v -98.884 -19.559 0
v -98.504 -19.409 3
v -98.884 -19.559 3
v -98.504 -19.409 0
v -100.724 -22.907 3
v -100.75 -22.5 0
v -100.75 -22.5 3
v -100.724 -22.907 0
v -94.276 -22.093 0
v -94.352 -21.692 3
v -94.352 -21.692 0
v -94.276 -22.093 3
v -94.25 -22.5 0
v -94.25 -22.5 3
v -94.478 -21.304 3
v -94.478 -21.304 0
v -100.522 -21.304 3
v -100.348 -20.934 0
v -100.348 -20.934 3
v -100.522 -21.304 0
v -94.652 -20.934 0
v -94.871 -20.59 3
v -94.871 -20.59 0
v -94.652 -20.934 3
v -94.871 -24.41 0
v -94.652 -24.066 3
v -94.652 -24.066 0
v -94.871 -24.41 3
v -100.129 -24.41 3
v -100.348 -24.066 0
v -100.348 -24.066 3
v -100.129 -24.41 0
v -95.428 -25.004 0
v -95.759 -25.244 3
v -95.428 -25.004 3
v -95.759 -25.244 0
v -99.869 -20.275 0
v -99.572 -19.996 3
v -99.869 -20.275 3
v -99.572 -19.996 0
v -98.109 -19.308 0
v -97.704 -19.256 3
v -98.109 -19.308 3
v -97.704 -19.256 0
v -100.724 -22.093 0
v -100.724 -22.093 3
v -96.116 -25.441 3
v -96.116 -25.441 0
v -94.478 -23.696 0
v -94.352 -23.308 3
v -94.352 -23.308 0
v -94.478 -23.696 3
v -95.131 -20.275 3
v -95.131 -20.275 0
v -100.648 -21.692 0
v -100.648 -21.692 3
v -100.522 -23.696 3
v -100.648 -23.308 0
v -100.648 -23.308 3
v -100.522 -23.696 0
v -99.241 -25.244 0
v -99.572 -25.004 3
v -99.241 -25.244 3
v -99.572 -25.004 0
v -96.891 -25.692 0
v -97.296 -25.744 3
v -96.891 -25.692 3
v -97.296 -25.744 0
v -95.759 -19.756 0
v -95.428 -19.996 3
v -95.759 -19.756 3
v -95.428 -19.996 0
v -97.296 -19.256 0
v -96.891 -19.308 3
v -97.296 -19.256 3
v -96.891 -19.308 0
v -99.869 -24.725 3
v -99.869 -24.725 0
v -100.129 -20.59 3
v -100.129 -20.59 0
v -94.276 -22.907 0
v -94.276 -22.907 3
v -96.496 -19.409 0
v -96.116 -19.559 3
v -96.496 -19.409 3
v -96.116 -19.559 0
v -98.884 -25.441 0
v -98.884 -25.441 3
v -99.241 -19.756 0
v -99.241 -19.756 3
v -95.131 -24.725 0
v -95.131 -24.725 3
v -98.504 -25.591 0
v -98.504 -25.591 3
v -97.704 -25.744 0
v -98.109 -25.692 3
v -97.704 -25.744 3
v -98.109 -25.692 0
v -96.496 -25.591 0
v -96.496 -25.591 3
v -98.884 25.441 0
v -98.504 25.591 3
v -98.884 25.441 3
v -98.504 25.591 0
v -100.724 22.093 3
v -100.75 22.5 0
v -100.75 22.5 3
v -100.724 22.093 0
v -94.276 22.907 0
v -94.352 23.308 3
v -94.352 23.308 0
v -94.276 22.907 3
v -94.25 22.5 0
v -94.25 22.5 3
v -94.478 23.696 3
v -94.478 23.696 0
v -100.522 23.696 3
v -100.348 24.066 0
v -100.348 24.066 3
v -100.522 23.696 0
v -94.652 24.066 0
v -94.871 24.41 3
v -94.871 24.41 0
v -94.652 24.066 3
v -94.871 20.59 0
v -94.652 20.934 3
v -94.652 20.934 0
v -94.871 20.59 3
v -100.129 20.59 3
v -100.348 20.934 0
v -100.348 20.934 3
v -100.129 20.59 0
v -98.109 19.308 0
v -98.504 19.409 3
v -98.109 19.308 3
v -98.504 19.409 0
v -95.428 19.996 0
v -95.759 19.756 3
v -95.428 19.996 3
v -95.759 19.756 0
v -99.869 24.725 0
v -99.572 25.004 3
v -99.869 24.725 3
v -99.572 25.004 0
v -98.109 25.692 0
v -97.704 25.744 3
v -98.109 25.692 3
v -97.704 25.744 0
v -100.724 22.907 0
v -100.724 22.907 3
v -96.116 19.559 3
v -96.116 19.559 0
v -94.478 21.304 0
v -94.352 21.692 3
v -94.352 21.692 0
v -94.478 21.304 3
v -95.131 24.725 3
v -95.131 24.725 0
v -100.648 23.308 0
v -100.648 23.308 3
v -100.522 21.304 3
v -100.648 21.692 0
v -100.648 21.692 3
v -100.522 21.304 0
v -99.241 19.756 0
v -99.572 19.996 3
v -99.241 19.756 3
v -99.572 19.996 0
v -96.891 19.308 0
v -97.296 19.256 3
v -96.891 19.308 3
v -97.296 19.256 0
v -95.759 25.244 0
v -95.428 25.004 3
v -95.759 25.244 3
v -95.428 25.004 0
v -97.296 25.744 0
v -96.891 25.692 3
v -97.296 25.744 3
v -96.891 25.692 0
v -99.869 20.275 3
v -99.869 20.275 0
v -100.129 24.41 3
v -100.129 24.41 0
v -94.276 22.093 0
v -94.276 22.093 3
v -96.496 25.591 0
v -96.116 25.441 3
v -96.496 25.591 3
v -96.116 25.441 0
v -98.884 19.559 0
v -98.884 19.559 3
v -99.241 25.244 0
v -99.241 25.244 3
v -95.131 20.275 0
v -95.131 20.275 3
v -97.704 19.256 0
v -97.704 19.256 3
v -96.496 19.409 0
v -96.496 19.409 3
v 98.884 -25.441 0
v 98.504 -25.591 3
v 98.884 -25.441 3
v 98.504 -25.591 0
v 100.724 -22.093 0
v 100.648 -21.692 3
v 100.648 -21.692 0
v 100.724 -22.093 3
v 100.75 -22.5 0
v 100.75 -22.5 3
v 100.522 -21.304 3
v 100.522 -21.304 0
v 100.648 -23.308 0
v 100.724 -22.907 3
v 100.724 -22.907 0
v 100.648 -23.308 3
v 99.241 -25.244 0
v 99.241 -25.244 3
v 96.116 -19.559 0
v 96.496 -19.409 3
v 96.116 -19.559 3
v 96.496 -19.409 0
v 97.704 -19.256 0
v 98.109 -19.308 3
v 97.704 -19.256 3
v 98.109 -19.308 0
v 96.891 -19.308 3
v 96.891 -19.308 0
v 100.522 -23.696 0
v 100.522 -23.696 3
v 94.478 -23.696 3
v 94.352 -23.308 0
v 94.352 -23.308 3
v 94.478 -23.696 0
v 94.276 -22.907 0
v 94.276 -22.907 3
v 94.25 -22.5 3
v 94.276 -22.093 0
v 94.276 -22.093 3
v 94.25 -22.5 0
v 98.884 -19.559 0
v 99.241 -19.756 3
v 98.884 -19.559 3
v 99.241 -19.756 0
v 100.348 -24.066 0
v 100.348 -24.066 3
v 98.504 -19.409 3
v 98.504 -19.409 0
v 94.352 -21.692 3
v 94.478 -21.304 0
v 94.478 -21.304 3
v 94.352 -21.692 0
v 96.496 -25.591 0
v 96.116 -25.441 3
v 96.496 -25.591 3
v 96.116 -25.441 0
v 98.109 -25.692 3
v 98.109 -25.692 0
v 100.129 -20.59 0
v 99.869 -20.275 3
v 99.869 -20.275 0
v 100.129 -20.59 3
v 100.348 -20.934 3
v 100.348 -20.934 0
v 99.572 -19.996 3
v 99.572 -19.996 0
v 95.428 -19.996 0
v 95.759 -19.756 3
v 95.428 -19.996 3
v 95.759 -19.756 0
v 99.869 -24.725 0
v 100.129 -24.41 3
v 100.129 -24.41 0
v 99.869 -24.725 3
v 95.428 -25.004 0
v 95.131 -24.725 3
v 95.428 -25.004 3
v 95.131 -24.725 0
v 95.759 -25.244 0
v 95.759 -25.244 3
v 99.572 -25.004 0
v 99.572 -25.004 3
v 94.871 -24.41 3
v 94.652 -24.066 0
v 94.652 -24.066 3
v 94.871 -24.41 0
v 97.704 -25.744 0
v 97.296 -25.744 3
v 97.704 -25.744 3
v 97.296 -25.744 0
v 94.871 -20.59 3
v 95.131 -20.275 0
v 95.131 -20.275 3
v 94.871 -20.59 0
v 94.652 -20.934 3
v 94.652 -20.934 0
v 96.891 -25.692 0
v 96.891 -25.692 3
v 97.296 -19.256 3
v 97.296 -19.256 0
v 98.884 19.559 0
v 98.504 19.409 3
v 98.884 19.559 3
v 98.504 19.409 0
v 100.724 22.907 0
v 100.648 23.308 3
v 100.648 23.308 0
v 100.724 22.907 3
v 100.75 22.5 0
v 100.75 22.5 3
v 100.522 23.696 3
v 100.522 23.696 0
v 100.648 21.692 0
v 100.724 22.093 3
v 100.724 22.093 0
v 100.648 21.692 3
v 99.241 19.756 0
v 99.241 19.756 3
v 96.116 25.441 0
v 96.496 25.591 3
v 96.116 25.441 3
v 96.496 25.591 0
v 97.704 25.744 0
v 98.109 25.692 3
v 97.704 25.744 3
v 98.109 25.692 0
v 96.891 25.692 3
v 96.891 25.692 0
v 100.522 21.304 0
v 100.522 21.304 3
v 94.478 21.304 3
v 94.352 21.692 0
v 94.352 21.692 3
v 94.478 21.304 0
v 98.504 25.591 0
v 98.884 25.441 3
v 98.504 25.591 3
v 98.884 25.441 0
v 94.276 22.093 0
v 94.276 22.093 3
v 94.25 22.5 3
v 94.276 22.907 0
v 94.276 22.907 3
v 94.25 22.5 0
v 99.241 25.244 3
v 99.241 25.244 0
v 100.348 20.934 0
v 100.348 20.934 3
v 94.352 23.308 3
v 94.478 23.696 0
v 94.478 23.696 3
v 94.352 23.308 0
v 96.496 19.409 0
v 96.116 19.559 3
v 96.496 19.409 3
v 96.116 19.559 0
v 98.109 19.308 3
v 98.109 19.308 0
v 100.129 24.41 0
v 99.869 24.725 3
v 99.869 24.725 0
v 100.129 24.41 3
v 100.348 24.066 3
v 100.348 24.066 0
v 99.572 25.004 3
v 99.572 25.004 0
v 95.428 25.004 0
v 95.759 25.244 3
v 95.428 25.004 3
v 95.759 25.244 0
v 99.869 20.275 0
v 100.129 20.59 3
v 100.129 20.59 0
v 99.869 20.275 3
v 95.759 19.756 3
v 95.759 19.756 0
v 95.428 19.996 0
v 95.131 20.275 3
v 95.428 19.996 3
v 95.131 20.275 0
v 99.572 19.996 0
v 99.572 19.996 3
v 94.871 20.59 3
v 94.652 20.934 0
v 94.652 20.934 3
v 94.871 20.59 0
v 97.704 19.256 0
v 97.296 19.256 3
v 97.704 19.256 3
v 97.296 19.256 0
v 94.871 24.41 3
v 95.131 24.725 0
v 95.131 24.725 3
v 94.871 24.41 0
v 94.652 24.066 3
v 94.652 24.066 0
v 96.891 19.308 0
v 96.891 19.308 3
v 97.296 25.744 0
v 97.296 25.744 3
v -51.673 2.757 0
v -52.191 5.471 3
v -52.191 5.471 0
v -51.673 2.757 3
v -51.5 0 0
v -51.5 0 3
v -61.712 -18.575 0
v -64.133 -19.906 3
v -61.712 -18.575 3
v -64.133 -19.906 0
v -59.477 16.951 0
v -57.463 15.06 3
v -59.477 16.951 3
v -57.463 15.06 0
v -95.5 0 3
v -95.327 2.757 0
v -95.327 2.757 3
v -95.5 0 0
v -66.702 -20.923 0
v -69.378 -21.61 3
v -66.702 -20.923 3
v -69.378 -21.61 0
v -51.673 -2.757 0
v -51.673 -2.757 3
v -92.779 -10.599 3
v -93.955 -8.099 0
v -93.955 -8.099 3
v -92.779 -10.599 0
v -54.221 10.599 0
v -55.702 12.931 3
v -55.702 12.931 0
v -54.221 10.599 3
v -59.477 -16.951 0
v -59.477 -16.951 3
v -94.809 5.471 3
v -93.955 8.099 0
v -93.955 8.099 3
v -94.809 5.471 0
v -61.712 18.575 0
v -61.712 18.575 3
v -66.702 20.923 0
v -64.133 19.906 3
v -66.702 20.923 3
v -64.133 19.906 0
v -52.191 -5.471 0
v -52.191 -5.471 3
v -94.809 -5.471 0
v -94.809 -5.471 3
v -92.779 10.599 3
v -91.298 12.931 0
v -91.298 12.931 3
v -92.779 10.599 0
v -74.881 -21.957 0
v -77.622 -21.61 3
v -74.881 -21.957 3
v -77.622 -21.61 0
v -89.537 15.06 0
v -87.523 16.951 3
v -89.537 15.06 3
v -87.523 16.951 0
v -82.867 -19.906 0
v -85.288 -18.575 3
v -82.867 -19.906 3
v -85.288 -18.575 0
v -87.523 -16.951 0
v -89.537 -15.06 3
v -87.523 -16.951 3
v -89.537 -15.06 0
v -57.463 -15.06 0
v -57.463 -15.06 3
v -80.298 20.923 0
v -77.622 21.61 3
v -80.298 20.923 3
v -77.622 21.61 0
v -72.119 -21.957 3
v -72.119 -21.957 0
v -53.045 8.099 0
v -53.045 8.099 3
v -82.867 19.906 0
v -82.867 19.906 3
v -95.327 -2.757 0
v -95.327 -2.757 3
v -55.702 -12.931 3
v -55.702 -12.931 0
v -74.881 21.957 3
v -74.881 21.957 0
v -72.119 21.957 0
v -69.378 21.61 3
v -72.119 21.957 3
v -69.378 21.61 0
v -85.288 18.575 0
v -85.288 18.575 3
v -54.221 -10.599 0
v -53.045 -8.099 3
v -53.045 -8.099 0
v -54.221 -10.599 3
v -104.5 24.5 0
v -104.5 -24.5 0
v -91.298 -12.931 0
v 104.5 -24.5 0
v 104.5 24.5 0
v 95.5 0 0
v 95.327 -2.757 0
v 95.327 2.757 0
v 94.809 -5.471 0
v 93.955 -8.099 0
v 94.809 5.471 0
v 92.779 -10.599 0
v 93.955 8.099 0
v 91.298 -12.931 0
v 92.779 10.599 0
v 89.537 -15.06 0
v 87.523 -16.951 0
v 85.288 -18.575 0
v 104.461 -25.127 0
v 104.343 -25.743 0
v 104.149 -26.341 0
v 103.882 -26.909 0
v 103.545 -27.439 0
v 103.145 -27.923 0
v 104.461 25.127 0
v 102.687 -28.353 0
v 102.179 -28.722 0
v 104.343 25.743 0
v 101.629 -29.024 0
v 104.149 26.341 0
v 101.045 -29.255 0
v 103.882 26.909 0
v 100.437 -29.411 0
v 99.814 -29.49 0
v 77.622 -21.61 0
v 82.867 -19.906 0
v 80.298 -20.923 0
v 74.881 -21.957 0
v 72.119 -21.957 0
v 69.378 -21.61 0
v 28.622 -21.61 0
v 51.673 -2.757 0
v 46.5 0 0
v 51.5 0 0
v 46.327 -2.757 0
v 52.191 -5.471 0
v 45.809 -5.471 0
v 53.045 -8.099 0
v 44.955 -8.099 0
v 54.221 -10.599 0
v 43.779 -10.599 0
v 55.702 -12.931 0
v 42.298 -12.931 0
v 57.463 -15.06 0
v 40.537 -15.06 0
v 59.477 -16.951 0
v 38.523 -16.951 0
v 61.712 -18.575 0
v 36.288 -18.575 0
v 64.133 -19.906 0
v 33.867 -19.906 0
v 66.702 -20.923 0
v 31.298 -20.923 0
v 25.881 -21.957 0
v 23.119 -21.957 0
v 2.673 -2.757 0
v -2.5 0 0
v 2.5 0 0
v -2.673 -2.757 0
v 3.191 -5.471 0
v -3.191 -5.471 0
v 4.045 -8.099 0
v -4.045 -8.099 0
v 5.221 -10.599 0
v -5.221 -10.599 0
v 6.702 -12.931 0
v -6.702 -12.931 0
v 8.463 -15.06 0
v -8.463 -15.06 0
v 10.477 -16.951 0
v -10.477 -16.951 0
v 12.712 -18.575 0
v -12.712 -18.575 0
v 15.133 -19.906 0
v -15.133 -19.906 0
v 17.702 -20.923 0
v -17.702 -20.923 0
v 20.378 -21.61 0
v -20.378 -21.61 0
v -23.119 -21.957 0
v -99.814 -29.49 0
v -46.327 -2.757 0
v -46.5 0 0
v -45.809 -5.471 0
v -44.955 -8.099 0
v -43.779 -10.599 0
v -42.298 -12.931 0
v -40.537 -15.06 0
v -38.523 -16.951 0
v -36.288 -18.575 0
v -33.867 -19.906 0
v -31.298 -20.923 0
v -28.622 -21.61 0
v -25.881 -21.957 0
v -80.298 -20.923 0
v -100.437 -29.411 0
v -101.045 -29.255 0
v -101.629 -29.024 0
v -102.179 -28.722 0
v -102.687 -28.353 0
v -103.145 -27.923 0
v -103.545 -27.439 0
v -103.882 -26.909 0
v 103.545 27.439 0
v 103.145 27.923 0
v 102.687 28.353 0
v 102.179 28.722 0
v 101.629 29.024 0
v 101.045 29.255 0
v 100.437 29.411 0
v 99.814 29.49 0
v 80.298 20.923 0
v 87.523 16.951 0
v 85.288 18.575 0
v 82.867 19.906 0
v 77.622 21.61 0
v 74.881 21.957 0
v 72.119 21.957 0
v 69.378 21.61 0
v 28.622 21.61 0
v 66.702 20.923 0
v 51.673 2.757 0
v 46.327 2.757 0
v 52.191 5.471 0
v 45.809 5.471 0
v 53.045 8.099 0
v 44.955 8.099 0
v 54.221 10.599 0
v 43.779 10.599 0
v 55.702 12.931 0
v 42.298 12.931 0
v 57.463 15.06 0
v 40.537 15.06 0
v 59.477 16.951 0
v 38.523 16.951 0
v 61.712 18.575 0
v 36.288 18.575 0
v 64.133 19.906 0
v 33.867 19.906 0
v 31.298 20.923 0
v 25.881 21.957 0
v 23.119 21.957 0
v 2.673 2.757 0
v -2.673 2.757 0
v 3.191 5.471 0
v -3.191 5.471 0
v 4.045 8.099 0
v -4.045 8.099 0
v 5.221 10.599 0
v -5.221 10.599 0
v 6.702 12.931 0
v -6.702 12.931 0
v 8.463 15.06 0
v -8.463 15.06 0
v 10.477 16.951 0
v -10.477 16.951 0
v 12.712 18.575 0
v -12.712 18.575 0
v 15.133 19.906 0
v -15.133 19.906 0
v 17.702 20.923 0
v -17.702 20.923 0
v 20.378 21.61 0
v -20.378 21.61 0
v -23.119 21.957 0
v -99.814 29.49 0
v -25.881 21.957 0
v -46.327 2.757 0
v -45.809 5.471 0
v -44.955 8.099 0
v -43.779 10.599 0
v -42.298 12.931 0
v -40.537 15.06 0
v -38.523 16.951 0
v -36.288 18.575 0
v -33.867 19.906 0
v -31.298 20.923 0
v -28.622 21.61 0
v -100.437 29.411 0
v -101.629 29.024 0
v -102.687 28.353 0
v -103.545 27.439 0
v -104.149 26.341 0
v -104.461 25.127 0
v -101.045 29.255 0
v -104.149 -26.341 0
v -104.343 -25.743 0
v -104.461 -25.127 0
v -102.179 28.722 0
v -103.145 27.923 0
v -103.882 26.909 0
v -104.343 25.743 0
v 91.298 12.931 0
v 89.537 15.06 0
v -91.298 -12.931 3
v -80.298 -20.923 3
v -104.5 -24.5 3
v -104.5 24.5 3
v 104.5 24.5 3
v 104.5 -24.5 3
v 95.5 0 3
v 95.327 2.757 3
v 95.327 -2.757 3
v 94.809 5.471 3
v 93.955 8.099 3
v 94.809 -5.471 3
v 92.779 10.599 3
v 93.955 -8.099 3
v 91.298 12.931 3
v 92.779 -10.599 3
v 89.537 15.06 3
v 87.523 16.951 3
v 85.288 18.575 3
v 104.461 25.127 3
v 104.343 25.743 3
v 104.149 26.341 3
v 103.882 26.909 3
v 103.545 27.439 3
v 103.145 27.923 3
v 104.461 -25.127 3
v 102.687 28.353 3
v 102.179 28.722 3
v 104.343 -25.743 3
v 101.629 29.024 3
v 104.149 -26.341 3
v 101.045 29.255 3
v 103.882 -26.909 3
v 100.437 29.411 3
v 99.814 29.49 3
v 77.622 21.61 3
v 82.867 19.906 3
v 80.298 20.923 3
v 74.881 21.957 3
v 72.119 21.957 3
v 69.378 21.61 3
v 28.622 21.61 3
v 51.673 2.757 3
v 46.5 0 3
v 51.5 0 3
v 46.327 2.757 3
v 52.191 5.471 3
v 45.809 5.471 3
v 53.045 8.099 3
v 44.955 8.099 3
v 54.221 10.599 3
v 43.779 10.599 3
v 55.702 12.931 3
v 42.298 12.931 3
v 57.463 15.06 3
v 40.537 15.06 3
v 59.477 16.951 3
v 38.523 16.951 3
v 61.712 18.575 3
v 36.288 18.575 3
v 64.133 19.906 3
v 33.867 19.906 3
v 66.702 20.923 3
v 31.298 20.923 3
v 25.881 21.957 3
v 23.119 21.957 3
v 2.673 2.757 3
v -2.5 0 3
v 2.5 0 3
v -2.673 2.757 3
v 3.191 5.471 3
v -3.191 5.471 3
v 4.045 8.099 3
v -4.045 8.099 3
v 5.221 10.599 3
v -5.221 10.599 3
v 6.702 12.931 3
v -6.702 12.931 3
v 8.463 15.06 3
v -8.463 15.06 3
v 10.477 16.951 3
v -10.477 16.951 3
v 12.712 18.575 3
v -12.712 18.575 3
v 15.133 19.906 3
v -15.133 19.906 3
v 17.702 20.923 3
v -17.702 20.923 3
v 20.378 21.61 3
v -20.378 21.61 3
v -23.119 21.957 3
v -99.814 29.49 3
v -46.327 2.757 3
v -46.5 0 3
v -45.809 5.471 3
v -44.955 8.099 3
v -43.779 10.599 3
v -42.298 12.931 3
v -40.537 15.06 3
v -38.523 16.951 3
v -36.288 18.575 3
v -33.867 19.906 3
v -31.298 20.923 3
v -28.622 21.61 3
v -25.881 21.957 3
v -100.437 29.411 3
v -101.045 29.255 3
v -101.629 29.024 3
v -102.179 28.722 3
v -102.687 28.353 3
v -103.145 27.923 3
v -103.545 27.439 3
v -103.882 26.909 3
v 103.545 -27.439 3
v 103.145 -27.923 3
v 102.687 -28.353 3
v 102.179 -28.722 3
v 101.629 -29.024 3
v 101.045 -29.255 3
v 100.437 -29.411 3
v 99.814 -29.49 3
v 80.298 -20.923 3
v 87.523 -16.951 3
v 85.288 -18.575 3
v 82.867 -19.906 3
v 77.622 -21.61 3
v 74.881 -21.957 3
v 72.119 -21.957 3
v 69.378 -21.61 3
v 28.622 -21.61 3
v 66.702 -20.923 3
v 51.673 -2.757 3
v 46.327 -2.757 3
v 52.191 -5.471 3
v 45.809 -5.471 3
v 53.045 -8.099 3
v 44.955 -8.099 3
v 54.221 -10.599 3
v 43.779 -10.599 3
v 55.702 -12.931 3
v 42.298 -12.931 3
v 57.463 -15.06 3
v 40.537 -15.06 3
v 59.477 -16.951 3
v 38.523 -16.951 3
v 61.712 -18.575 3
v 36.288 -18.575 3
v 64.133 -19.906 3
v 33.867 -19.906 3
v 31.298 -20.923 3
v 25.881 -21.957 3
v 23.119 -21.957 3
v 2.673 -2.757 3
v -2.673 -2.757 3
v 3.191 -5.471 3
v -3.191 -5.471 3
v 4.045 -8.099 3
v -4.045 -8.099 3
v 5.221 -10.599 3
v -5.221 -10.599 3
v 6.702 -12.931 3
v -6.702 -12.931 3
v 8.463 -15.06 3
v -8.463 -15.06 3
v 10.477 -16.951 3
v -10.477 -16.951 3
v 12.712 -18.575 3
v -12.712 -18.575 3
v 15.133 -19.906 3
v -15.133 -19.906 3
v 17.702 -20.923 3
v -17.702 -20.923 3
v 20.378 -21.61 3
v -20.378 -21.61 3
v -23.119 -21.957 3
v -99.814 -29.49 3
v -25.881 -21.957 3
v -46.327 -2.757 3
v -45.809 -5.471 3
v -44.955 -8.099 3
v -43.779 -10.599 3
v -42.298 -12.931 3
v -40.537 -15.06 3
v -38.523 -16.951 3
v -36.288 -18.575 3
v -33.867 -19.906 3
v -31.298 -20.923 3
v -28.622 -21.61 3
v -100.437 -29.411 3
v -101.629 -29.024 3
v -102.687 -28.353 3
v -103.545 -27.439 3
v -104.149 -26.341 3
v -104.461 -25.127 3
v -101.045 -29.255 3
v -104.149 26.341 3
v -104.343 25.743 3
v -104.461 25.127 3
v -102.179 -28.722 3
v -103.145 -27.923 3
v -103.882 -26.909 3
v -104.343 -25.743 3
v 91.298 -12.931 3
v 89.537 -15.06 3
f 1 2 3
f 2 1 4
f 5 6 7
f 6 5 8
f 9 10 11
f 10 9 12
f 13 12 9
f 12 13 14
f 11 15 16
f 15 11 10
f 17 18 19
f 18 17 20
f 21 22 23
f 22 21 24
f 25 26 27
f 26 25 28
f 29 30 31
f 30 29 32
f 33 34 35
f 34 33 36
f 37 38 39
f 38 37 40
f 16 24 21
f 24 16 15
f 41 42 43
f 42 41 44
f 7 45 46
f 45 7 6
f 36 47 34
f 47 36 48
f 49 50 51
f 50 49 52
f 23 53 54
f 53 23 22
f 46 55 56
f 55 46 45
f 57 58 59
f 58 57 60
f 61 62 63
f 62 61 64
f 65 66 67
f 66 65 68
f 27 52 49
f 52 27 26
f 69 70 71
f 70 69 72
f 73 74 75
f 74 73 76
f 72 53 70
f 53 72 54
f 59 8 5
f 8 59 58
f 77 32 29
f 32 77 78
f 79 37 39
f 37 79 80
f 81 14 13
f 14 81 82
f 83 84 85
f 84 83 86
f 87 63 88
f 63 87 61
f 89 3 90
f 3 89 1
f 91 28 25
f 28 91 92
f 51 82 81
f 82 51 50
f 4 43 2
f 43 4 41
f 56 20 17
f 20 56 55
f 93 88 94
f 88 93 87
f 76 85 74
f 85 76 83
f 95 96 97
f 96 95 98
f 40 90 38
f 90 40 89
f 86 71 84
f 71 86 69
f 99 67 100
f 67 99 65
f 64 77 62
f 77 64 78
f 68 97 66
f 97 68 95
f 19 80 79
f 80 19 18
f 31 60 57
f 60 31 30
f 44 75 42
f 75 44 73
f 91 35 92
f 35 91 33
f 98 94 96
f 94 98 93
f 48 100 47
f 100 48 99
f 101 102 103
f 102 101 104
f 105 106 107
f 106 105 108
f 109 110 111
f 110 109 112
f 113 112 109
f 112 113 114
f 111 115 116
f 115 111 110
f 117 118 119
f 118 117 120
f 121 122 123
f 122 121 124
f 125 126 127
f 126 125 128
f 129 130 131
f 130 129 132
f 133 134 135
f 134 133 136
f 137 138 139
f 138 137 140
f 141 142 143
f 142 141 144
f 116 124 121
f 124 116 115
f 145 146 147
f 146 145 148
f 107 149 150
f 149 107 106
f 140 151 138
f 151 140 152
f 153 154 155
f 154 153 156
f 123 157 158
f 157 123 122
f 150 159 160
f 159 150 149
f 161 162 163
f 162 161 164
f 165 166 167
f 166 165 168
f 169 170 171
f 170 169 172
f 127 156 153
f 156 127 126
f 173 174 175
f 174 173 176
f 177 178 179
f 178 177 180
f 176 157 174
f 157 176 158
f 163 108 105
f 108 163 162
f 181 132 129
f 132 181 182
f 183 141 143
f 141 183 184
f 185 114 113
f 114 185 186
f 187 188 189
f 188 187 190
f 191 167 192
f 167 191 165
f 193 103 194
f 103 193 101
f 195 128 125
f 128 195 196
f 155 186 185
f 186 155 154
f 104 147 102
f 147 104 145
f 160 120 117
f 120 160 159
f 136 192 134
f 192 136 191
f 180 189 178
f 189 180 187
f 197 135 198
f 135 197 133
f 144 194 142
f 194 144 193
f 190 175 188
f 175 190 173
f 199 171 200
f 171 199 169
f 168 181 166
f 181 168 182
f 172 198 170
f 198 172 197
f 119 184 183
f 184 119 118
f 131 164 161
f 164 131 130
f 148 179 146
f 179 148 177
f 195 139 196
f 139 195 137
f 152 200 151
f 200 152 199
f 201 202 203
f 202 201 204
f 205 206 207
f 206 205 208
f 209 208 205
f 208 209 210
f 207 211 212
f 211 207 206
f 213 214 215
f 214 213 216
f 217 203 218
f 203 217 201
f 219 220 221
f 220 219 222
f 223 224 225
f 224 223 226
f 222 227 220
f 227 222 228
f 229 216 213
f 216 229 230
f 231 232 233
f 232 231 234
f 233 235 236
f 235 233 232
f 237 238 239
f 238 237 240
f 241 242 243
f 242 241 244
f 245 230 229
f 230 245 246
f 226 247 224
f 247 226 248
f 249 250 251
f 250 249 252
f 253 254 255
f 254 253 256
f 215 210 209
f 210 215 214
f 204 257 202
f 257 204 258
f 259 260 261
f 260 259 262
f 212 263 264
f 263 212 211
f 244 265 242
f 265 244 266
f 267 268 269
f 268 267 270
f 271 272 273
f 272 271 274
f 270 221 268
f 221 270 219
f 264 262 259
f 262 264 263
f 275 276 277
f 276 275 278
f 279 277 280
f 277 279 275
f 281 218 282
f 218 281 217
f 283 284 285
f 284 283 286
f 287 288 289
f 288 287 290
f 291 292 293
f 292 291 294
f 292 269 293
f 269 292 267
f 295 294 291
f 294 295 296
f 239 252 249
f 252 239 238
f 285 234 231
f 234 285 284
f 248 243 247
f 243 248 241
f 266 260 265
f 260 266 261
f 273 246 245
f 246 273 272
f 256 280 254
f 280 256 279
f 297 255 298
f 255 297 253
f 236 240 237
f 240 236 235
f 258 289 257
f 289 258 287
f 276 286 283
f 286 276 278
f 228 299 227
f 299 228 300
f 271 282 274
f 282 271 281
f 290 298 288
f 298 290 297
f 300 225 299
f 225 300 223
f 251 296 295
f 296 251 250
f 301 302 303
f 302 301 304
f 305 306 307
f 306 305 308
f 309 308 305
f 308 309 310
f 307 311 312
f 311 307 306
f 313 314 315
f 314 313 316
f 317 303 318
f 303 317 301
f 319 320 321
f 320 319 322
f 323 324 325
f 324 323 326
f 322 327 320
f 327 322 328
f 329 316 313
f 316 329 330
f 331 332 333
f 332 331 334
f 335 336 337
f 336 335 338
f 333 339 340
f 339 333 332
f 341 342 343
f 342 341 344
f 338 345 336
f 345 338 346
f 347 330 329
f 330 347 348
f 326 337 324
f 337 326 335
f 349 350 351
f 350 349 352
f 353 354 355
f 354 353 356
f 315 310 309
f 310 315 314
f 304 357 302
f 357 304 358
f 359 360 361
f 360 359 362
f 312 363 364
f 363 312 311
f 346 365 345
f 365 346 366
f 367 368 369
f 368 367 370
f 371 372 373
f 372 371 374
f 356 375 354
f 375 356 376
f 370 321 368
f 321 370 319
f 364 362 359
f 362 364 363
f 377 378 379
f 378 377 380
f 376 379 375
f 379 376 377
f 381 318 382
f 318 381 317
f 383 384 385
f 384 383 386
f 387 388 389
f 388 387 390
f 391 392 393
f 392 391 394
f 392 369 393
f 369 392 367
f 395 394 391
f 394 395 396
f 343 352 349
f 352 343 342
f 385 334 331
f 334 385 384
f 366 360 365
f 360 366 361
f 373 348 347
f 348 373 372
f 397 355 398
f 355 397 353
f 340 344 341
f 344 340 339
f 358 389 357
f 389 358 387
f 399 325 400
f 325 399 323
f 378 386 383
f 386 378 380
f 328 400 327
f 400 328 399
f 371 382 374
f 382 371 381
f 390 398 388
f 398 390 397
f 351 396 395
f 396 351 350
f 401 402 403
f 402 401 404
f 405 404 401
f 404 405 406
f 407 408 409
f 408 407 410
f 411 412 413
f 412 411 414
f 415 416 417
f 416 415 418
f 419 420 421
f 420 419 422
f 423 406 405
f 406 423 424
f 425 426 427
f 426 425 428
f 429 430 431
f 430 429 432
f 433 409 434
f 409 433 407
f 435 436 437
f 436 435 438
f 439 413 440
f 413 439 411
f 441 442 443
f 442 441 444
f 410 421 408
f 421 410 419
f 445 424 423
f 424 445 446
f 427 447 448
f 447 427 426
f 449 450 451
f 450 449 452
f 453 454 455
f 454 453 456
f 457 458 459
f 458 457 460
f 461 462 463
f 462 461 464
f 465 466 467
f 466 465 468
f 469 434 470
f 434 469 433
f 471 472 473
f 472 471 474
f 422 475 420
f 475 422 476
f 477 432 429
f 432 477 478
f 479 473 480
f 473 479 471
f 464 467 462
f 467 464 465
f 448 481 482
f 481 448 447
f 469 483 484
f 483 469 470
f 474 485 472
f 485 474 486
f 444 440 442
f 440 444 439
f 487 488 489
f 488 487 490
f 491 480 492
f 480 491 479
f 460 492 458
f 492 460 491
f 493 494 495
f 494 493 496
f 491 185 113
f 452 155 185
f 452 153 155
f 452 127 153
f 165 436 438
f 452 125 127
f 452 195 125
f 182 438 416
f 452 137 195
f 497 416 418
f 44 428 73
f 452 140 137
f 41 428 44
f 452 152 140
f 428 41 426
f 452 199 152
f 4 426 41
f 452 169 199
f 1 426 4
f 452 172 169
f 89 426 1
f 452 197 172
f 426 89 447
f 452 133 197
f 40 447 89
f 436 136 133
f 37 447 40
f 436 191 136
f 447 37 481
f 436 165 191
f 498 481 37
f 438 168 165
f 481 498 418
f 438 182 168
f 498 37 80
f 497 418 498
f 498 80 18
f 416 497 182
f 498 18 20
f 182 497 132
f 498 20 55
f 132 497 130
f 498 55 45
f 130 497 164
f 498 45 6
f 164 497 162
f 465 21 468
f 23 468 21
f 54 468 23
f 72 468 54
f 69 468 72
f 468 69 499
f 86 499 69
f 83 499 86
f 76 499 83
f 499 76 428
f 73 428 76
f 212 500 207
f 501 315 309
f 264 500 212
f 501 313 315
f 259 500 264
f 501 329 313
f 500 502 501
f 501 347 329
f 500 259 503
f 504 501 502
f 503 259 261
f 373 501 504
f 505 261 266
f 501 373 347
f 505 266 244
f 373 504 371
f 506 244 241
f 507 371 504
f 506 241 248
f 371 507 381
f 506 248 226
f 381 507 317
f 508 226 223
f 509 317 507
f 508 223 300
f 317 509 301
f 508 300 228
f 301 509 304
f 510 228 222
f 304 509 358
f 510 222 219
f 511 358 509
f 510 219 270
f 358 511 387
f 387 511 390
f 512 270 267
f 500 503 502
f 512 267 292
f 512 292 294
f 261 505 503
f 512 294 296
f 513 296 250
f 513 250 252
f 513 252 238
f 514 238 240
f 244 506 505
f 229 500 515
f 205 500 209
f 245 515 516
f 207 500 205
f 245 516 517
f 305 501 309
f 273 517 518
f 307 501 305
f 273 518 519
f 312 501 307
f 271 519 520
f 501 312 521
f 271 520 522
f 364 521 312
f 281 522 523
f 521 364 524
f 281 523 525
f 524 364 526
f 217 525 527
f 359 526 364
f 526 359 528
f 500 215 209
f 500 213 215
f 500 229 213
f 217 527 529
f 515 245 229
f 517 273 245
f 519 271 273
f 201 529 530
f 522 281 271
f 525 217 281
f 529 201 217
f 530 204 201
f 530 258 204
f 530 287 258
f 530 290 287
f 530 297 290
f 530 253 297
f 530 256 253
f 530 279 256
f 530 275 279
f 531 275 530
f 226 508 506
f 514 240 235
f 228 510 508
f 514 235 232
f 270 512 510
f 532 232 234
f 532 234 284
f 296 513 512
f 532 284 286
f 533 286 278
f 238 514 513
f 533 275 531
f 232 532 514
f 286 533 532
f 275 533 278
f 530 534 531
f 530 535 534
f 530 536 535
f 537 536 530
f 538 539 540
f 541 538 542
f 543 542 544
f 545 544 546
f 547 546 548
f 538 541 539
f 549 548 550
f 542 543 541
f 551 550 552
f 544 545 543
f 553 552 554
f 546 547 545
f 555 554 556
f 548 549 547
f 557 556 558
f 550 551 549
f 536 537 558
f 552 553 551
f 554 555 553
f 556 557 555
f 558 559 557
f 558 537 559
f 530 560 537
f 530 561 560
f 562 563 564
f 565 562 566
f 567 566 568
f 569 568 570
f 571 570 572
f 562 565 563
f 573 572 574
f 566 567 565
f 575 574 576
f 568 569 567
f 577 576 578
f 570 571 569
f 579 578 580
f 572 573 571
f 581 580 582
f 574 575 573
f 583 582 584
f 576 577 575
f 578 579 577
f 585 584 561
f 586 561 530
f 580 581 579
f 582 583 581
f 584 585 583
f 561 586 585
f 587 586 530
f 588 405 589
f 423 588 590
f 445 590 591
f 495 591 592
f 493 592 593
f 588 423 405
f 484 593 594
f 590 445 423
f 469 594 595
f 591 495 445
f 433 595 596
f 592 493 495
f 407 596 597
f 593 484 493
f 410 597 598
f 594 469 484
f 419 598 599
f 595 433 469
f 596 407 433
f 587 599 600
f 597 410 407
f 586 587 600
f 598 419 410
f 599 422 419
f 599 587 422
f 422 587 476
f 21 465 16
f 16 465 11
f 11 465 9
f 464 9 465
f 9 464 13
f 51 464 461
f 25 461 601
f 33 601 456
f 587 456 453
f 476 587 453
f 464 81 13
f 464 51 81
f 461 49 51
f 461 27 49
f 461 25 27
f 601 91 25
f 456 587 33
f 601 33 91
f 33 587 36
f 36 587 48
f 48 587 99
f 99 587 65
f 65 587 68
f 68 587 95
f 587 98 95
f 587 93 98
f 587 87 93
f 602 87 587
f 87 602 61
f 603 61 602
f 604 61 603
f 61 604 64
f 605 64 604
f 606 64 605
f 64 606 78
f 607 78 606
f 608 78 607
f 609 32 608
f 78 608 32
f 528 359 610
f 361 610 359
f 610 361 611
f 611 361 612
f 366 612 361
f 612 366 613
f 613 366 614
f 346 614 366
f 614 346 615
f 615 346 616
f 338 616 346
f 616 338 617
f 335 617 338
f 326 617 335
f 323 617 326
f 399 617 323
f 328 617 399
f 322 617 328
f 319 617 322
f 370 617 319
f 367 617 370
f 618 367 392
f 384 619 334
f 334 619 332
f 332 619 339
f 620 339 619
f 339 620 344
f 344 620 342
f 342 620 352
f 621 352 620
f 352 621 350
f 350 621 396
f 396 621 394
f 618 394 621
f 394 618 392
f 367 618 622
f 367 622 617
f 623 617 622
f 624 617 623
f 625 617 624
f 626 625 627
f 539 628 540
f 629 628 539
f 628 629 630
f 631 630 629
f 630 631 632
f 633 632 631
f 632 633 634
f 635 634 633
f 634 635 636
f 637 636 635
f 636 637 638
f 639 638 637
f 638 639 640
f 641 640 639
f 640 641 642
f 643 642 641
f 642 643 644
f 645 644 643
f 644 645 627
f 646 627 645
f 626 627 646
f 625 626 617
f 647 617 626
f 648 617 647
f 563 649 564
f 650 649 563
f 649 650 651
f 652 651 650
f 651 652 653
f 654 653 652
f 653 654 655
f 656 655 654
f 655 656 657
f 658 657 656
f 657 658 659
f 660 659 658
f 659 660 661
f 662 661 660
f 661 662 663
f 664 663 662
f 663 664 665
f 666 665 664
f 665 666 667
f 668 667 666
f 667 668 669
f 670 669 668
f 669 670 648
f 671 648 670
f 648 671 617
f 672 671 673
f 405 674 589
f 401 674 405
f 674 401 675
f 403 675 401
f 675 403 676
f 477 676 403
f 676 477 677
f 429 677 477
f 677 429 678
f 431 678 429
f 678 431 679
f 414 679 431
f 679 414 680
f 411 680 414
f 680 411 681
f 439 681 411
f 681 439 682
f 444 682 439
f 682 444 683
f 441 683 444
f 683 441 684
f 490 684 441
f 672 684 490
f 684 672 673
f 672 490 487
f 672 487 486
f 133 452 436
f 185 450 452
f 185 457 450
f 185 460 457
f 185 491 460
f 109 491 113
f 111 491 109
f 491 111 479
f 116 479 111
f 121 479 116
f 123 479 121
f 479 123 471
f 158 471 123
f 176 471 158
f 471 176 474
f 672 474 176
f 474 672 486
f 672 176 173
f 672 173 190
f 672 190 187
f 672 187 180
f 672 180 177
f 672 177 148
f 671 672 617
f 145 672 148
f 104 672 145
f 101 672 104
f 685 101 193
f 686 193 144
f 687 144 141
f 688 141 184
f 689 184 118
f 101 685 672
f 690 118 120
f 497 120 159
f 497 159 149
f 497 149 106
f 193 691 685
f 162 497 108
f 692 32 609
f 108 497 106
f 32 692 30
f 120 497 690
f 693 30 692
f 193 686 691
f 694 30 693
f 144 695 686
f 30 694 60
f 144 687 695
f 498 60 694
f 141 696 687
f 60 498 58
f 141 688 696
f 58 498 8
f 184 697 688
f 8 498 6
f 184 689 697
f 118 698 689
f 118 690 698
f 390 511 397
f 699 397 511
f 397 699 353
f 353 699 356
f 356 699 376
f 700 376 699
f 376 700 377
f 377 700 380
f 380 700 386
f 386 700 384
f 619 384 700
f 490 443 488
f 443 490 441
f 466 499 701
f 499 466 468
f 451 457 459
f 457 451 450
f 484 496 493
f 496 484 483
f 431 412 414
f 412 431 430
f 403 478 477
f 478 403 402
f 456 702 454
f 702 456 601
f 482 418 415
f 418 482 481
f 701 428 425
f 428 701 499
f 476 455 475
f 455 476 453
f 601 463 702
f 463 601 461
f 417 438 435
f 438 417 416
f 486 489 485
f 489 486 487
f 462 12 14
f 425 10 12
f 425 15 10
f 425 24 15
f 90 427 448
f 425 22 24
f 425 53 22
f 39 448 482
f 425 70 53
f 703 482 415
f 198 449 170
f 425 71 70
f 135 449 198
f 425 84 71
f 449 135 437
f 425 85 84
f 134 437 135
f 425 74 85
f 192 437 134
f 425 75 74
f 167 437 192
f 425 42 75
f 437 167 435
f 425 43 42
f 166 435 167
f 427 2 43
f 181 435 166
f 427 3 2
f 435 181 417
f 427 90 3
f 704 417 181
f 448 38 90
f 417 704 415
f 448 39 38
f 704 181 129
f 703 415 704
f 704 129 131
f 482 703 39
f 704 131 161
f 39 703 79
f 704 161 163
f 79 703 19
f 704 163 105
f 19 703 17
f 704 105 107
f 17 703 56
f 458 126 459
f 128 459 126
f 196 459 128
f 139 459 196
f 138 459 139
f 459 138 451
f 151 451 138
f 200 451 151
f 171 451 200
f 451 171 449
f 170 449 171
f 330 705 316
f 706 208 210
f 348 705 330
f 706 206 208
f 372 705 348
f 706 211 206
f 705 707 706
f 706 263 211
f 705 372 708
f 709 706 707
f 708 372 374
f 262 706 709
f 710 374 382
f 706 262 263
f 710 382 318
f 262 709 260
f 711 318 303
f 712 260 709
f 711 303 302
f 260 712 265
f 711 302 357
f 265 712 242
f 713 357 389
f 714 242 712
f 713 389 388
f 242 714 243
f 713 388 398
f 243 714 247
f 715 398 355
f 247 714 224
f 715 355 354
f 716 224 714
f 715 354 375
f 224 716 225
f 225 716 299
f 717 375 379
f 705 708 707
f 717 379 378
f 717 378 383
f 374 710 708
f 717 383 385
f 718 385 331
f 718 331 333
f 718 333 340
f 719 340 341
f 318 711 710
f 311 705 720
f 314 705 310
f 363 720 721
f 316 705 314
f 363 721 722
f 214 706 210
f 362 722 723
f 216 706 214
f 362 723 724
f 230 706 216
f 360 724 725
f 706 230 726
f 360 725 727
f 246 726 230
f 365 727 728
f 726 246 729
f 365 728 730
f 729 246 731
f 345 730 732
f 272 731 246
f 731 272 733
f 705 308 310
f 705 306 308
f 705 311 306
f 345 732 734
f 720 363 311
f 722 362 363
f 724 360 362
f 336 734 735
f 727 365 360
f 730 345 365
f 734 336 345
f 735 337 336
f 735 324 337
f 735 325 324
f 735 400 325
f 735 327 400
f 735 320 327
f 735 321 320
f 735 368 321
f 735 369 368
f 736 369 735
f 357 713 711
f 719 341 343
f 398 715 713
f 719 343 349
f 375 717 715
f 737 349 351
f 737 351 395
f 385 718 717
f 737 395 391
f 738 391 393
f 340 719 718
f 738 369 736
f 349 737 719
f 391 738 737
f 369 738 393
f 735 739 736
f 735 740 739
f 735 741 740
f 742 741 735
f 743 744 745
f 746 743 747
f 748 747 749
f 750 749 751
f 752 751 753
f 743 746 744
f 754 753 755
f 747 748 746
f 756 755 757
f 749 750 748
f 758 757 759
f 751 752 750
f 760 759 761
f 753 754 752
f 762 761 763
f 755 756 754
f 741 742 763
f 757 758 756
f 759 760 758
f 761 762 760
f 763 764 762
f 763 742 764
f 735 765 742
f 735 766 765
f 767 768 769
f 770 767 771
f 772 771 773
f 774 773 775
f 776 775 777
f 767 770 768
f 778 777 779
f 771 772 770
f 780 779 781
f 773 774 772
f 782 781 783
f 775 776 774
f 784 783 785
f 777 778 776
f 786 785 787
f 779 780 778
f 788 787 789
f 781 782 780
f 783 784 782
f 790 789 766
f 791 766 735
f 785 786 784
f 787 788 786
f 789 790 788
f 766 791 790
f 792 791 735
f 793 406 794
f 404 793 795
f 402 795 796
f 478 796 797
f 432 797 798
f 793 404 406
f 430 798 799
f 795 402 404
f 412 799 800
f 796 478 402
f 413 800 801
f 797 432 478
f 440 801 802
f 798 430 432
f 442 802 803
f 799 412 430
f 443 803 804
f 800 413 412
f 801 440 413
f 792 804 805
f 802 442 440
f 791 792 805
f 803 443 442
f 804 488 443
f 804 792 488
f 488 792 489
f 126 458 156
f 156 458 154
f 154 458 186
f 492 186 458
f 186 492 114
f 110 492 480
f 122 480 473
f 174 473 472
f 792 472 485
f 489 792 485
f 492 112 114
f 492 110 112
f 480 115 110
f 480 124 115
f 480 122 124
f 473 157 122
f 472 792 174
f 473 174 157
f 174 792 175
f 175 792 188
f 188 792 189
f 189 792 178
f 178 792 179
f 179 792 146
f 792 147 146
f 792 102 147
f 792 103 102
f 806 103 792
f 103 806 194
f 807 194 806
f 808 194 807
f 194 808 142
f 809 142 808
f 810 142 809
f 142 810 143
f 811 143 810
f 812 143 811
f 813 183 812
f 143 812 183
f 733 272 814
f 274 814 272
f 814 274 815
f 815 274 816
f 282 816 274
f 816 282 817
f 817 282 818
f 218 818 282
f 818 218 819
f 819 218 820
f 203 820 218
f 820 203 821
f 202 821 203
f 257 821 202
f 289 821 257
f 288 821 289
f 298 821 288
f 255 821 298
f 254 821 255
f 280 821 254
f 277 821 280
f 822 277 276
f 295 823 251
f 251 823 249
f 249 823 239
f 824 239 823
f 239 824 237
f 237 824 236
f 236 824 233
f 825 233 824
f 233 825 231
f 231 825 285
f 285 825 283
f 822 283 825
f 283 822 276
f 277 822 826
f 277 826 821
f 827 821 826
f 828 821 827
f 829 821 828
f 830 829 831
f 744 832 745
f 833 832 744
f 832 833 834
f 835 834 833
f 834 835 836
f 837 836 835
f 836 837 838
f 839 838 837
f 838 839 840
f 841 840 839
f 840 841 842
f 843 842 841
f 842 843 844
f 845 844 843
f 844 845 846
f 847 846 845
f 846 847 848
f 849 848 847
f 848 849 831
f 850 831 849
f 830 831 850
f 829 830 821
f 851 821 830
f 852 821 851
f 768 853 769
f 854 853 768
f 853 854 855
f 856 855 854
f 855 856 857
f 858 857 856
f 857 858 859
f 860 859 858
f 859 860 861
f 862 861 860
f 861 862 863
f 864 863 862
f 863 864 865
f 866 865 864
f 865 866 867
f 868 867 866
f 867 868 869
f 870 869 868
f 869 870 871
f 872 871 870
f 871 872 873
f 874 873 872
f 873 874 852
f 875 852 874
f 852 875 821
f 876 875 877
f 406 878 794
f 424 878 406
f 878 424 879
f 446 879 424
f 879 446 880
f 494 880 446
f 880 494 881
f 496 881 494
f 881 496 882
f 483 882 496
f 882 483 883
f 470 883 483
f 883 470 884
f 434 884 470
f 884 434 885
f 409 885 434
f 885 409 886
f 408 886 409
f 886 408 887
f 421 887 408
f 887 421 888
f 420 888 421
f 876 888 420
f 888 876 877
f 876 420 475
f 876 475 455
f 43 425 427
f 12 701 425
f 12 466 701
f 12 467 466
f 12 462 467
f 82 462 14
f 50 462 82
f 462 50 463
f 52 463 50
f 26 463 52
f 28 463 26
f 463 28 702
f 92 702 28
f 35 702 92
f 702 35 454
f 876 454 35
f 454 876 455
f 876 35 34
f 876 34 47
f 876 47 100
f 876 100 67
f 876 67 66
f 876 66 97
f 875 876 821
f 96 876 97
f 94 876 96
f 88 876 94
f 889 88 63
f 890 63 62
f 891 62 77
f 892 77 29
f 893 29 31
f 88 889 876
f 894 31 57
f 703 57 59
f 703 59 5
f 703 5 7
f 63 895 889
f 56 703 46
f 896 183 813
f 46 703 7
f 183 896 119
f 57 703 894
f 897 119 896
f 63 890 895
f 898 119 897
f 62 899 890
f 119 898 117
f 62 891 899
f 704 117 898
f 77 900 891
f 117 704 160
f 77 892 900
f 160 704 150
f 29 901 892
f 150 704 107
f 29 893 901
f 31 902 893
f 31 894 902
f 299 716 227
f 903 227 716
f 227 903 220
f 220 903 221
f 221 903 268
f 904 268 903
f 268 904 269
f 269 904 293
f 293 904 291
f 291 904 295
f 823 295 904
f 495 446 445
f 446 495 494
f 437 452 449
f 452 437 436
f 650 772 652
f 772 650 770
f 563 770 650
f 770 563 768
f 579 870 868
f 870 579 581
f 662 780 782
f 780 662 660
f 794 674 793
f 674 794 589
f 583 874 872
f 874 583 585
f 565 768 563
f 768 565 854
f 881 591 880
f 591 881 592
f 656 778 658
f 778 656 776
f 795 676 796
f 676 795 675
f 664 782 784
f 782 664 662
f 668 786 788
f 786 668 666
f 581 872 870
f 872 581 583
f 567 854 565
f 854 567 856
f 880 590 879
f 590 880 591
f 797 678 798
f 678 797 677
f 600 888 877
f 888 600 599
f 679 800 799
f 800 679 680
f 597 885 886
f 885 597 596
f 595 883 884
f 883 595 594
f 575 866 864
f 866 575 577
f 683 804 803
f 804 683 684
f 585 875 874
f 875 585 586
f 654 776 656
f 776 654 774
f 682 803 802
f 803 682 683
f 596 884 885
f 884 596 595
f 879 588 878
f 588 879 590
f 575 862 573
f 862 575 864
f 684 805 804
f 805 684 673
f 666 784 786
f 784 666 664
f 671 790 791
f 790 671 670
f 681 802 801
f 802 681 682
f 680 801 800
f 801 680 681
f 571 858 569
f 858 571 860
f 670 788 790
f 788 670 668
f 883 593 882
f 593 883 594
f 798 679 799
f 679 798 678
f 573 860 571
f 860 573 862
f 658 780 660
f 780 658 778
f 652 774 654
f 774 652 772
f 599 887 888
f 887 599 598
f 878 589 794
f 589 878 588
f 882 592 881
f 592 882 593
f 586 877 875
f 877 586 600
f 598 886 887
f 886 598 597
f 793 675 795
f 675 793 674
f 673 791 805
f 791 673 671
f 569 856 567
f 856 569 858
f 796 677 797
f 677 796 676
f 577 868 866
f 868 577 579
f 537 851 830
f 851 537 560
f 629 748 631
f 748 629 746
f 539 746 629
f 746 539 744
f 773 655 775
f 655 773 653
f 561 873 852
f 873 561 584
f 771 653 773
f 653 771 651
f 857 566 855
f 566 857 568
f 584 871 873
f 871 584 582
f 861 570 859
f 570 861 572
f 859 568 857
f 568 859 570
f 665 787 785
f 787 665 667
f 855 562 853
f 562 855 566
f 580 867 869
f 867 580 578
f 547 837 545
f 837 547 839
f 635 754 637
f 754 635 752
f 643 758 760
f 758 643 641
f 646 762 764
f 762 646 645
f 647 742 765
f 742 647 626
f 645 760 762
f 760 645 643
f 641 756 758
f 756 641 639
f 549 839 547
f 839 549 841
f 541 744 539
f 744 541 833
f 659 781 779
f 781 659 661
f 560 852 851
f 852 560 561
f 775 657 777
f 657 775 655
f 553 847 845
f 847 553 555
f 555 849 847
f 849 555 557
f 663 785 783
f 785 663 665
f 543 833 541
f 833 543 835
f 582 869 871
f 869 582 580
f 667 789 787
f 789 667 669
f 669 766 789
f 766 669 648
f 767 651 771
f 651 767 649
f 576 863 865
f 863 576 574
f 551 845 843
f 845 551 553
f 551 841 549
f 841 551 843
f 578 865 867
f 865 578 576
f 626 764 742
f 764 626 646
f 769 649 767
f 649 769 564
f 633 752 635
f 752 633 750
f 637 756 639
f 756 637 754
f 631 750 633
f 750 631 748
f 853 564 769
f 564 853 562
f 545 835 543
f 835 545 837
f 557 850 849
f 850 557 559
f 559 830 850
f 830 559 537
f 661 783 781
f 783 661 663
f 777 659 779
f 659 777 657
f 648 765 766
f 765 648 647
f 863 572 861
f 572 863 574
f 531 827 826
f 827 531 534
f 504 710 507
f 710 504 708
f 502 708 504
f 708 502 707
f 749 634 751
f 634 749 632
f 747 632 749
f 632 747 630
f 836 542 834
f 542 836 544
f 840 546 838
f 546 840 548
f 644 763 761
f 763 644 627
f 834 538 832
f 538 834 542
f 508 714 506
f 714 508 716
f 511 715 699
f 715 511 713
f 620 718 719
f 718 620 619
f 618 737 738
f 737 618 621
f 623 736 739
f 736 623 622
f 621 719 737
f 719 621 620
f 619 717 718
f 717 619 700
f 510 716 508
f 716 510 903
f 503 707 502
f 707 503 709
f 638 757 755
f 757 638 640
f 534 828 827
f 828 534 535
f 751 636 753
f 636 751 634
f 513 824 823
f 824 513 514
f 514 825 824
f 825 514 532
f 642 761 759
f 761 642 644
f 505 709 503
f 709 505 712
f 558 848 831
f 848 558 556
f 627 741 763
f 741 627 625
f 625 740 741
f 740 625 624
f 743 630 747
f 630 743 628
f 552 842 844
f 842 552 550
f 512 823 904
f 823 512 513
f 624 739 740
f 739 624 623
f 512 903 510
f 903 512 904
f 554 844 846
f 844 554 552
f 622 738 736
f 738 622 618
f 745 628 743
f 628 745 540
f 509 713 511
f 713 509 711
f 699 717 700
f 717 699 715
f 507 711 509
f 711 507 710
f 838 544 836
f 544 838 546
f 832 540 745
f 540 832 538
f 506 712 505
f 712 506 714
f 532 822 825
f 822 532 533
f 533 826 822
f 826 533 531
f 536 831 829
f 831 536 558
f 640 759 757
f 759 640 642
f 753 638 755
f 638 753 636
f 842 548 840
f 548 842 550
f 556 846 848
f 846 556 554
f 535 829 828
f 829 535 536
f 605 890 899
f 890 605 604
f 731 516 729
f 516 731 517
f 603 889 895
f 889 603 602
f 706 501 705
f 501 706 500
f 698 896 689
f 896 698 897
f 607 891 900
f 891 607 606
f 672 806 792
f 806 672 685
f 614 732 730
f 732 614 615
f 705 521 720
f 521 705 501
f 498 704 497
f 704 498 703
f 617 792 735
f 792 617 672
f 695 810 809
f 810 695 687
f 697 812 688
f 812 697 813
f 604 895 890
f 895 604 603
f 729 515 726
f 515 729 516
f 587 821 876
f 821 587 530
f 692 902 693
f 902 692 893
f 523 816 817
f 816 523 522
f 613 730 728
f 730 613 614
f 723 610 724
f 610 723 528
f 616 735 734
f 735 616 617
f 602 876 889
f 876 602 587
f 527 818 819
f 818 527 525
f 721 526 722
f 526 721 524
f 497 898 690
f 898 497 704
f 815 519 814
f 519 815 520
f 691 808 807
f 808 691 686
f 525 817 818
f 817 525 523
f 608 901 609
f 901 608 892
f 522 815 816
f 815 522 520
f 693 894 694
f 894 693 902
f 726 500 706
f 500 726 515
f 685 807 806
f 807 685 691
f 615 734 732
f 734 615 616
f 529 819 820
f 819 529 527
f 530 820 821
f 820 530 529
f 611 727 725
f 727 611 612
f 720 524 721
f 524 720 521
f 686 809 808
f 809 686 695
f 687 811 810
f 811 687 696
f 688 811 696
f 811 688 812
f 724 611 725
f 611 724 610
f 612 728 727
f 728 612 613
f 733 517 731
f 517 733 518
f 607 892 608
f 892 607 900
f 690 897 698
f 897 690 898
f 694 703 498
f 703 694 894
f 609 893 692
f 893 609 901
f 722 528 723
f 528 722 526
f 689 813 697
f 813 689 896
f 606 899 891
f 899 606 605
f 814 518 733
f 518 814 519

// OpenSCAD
$fn = 50;


difference() {
	union() {
		hull() {
			translate(v = [-99.5000000000, 24.5000000000, 0]) {
				cylinder(h = 3, r = 5);
			}
			translate(v = [99.5000000000, 24.5000000000, 0]) {
				cylinder(h = 3, r = 5);
			}
			translate(v = [-99.5000000000, -24.5000000000, 0]) {
				cylinder(h = 3, r = 5);
			}
			translate(v = [99.5000000000, -24.5000000000, 0]) {
				cylinder(h = 3, r = 5);
			}
		}
	}
	union() {
		#translate(v = [-97.5000000000, -22.5000000000, -100.0000000000]) {
			cylinder(h = 200, r = 3.2500000000);
		}
		#translate(v = [-97.5000000000, 22.5000000000, -100.0000000000]) {
			cylinder(h = 200, r = 3.2500000000);
		}
		#translate(v = [97.5000000000, -22.5000000000, -100.0000000000]) {
			cylinder(h = 200, r = 3.2500000000);
		}
		#translate(v = [97.5000000000, 22.5000000000, -100.0000000000]) {
			cylinder(h = 200, r = 3.2500000000);
		}
		#translate(v = [-73.5000000000, 0, 0]) {
			cylinder(h = 3, r = 22.0000000000);
		}
		#translate(v = [-24.5000000000, 0, 0]) {
			cylinder(h = 3, r = 22.0000000000);
		}
		#translate(v = [24.5000000000, 0, 0]) {
			cylinder(h = 3, r = 22.0000000000);
		}
		#translate(v = [73.5000000000, 0, 0]) {
			cylinder(h = 3, r = 22.0000000000);
		}
	}
}
